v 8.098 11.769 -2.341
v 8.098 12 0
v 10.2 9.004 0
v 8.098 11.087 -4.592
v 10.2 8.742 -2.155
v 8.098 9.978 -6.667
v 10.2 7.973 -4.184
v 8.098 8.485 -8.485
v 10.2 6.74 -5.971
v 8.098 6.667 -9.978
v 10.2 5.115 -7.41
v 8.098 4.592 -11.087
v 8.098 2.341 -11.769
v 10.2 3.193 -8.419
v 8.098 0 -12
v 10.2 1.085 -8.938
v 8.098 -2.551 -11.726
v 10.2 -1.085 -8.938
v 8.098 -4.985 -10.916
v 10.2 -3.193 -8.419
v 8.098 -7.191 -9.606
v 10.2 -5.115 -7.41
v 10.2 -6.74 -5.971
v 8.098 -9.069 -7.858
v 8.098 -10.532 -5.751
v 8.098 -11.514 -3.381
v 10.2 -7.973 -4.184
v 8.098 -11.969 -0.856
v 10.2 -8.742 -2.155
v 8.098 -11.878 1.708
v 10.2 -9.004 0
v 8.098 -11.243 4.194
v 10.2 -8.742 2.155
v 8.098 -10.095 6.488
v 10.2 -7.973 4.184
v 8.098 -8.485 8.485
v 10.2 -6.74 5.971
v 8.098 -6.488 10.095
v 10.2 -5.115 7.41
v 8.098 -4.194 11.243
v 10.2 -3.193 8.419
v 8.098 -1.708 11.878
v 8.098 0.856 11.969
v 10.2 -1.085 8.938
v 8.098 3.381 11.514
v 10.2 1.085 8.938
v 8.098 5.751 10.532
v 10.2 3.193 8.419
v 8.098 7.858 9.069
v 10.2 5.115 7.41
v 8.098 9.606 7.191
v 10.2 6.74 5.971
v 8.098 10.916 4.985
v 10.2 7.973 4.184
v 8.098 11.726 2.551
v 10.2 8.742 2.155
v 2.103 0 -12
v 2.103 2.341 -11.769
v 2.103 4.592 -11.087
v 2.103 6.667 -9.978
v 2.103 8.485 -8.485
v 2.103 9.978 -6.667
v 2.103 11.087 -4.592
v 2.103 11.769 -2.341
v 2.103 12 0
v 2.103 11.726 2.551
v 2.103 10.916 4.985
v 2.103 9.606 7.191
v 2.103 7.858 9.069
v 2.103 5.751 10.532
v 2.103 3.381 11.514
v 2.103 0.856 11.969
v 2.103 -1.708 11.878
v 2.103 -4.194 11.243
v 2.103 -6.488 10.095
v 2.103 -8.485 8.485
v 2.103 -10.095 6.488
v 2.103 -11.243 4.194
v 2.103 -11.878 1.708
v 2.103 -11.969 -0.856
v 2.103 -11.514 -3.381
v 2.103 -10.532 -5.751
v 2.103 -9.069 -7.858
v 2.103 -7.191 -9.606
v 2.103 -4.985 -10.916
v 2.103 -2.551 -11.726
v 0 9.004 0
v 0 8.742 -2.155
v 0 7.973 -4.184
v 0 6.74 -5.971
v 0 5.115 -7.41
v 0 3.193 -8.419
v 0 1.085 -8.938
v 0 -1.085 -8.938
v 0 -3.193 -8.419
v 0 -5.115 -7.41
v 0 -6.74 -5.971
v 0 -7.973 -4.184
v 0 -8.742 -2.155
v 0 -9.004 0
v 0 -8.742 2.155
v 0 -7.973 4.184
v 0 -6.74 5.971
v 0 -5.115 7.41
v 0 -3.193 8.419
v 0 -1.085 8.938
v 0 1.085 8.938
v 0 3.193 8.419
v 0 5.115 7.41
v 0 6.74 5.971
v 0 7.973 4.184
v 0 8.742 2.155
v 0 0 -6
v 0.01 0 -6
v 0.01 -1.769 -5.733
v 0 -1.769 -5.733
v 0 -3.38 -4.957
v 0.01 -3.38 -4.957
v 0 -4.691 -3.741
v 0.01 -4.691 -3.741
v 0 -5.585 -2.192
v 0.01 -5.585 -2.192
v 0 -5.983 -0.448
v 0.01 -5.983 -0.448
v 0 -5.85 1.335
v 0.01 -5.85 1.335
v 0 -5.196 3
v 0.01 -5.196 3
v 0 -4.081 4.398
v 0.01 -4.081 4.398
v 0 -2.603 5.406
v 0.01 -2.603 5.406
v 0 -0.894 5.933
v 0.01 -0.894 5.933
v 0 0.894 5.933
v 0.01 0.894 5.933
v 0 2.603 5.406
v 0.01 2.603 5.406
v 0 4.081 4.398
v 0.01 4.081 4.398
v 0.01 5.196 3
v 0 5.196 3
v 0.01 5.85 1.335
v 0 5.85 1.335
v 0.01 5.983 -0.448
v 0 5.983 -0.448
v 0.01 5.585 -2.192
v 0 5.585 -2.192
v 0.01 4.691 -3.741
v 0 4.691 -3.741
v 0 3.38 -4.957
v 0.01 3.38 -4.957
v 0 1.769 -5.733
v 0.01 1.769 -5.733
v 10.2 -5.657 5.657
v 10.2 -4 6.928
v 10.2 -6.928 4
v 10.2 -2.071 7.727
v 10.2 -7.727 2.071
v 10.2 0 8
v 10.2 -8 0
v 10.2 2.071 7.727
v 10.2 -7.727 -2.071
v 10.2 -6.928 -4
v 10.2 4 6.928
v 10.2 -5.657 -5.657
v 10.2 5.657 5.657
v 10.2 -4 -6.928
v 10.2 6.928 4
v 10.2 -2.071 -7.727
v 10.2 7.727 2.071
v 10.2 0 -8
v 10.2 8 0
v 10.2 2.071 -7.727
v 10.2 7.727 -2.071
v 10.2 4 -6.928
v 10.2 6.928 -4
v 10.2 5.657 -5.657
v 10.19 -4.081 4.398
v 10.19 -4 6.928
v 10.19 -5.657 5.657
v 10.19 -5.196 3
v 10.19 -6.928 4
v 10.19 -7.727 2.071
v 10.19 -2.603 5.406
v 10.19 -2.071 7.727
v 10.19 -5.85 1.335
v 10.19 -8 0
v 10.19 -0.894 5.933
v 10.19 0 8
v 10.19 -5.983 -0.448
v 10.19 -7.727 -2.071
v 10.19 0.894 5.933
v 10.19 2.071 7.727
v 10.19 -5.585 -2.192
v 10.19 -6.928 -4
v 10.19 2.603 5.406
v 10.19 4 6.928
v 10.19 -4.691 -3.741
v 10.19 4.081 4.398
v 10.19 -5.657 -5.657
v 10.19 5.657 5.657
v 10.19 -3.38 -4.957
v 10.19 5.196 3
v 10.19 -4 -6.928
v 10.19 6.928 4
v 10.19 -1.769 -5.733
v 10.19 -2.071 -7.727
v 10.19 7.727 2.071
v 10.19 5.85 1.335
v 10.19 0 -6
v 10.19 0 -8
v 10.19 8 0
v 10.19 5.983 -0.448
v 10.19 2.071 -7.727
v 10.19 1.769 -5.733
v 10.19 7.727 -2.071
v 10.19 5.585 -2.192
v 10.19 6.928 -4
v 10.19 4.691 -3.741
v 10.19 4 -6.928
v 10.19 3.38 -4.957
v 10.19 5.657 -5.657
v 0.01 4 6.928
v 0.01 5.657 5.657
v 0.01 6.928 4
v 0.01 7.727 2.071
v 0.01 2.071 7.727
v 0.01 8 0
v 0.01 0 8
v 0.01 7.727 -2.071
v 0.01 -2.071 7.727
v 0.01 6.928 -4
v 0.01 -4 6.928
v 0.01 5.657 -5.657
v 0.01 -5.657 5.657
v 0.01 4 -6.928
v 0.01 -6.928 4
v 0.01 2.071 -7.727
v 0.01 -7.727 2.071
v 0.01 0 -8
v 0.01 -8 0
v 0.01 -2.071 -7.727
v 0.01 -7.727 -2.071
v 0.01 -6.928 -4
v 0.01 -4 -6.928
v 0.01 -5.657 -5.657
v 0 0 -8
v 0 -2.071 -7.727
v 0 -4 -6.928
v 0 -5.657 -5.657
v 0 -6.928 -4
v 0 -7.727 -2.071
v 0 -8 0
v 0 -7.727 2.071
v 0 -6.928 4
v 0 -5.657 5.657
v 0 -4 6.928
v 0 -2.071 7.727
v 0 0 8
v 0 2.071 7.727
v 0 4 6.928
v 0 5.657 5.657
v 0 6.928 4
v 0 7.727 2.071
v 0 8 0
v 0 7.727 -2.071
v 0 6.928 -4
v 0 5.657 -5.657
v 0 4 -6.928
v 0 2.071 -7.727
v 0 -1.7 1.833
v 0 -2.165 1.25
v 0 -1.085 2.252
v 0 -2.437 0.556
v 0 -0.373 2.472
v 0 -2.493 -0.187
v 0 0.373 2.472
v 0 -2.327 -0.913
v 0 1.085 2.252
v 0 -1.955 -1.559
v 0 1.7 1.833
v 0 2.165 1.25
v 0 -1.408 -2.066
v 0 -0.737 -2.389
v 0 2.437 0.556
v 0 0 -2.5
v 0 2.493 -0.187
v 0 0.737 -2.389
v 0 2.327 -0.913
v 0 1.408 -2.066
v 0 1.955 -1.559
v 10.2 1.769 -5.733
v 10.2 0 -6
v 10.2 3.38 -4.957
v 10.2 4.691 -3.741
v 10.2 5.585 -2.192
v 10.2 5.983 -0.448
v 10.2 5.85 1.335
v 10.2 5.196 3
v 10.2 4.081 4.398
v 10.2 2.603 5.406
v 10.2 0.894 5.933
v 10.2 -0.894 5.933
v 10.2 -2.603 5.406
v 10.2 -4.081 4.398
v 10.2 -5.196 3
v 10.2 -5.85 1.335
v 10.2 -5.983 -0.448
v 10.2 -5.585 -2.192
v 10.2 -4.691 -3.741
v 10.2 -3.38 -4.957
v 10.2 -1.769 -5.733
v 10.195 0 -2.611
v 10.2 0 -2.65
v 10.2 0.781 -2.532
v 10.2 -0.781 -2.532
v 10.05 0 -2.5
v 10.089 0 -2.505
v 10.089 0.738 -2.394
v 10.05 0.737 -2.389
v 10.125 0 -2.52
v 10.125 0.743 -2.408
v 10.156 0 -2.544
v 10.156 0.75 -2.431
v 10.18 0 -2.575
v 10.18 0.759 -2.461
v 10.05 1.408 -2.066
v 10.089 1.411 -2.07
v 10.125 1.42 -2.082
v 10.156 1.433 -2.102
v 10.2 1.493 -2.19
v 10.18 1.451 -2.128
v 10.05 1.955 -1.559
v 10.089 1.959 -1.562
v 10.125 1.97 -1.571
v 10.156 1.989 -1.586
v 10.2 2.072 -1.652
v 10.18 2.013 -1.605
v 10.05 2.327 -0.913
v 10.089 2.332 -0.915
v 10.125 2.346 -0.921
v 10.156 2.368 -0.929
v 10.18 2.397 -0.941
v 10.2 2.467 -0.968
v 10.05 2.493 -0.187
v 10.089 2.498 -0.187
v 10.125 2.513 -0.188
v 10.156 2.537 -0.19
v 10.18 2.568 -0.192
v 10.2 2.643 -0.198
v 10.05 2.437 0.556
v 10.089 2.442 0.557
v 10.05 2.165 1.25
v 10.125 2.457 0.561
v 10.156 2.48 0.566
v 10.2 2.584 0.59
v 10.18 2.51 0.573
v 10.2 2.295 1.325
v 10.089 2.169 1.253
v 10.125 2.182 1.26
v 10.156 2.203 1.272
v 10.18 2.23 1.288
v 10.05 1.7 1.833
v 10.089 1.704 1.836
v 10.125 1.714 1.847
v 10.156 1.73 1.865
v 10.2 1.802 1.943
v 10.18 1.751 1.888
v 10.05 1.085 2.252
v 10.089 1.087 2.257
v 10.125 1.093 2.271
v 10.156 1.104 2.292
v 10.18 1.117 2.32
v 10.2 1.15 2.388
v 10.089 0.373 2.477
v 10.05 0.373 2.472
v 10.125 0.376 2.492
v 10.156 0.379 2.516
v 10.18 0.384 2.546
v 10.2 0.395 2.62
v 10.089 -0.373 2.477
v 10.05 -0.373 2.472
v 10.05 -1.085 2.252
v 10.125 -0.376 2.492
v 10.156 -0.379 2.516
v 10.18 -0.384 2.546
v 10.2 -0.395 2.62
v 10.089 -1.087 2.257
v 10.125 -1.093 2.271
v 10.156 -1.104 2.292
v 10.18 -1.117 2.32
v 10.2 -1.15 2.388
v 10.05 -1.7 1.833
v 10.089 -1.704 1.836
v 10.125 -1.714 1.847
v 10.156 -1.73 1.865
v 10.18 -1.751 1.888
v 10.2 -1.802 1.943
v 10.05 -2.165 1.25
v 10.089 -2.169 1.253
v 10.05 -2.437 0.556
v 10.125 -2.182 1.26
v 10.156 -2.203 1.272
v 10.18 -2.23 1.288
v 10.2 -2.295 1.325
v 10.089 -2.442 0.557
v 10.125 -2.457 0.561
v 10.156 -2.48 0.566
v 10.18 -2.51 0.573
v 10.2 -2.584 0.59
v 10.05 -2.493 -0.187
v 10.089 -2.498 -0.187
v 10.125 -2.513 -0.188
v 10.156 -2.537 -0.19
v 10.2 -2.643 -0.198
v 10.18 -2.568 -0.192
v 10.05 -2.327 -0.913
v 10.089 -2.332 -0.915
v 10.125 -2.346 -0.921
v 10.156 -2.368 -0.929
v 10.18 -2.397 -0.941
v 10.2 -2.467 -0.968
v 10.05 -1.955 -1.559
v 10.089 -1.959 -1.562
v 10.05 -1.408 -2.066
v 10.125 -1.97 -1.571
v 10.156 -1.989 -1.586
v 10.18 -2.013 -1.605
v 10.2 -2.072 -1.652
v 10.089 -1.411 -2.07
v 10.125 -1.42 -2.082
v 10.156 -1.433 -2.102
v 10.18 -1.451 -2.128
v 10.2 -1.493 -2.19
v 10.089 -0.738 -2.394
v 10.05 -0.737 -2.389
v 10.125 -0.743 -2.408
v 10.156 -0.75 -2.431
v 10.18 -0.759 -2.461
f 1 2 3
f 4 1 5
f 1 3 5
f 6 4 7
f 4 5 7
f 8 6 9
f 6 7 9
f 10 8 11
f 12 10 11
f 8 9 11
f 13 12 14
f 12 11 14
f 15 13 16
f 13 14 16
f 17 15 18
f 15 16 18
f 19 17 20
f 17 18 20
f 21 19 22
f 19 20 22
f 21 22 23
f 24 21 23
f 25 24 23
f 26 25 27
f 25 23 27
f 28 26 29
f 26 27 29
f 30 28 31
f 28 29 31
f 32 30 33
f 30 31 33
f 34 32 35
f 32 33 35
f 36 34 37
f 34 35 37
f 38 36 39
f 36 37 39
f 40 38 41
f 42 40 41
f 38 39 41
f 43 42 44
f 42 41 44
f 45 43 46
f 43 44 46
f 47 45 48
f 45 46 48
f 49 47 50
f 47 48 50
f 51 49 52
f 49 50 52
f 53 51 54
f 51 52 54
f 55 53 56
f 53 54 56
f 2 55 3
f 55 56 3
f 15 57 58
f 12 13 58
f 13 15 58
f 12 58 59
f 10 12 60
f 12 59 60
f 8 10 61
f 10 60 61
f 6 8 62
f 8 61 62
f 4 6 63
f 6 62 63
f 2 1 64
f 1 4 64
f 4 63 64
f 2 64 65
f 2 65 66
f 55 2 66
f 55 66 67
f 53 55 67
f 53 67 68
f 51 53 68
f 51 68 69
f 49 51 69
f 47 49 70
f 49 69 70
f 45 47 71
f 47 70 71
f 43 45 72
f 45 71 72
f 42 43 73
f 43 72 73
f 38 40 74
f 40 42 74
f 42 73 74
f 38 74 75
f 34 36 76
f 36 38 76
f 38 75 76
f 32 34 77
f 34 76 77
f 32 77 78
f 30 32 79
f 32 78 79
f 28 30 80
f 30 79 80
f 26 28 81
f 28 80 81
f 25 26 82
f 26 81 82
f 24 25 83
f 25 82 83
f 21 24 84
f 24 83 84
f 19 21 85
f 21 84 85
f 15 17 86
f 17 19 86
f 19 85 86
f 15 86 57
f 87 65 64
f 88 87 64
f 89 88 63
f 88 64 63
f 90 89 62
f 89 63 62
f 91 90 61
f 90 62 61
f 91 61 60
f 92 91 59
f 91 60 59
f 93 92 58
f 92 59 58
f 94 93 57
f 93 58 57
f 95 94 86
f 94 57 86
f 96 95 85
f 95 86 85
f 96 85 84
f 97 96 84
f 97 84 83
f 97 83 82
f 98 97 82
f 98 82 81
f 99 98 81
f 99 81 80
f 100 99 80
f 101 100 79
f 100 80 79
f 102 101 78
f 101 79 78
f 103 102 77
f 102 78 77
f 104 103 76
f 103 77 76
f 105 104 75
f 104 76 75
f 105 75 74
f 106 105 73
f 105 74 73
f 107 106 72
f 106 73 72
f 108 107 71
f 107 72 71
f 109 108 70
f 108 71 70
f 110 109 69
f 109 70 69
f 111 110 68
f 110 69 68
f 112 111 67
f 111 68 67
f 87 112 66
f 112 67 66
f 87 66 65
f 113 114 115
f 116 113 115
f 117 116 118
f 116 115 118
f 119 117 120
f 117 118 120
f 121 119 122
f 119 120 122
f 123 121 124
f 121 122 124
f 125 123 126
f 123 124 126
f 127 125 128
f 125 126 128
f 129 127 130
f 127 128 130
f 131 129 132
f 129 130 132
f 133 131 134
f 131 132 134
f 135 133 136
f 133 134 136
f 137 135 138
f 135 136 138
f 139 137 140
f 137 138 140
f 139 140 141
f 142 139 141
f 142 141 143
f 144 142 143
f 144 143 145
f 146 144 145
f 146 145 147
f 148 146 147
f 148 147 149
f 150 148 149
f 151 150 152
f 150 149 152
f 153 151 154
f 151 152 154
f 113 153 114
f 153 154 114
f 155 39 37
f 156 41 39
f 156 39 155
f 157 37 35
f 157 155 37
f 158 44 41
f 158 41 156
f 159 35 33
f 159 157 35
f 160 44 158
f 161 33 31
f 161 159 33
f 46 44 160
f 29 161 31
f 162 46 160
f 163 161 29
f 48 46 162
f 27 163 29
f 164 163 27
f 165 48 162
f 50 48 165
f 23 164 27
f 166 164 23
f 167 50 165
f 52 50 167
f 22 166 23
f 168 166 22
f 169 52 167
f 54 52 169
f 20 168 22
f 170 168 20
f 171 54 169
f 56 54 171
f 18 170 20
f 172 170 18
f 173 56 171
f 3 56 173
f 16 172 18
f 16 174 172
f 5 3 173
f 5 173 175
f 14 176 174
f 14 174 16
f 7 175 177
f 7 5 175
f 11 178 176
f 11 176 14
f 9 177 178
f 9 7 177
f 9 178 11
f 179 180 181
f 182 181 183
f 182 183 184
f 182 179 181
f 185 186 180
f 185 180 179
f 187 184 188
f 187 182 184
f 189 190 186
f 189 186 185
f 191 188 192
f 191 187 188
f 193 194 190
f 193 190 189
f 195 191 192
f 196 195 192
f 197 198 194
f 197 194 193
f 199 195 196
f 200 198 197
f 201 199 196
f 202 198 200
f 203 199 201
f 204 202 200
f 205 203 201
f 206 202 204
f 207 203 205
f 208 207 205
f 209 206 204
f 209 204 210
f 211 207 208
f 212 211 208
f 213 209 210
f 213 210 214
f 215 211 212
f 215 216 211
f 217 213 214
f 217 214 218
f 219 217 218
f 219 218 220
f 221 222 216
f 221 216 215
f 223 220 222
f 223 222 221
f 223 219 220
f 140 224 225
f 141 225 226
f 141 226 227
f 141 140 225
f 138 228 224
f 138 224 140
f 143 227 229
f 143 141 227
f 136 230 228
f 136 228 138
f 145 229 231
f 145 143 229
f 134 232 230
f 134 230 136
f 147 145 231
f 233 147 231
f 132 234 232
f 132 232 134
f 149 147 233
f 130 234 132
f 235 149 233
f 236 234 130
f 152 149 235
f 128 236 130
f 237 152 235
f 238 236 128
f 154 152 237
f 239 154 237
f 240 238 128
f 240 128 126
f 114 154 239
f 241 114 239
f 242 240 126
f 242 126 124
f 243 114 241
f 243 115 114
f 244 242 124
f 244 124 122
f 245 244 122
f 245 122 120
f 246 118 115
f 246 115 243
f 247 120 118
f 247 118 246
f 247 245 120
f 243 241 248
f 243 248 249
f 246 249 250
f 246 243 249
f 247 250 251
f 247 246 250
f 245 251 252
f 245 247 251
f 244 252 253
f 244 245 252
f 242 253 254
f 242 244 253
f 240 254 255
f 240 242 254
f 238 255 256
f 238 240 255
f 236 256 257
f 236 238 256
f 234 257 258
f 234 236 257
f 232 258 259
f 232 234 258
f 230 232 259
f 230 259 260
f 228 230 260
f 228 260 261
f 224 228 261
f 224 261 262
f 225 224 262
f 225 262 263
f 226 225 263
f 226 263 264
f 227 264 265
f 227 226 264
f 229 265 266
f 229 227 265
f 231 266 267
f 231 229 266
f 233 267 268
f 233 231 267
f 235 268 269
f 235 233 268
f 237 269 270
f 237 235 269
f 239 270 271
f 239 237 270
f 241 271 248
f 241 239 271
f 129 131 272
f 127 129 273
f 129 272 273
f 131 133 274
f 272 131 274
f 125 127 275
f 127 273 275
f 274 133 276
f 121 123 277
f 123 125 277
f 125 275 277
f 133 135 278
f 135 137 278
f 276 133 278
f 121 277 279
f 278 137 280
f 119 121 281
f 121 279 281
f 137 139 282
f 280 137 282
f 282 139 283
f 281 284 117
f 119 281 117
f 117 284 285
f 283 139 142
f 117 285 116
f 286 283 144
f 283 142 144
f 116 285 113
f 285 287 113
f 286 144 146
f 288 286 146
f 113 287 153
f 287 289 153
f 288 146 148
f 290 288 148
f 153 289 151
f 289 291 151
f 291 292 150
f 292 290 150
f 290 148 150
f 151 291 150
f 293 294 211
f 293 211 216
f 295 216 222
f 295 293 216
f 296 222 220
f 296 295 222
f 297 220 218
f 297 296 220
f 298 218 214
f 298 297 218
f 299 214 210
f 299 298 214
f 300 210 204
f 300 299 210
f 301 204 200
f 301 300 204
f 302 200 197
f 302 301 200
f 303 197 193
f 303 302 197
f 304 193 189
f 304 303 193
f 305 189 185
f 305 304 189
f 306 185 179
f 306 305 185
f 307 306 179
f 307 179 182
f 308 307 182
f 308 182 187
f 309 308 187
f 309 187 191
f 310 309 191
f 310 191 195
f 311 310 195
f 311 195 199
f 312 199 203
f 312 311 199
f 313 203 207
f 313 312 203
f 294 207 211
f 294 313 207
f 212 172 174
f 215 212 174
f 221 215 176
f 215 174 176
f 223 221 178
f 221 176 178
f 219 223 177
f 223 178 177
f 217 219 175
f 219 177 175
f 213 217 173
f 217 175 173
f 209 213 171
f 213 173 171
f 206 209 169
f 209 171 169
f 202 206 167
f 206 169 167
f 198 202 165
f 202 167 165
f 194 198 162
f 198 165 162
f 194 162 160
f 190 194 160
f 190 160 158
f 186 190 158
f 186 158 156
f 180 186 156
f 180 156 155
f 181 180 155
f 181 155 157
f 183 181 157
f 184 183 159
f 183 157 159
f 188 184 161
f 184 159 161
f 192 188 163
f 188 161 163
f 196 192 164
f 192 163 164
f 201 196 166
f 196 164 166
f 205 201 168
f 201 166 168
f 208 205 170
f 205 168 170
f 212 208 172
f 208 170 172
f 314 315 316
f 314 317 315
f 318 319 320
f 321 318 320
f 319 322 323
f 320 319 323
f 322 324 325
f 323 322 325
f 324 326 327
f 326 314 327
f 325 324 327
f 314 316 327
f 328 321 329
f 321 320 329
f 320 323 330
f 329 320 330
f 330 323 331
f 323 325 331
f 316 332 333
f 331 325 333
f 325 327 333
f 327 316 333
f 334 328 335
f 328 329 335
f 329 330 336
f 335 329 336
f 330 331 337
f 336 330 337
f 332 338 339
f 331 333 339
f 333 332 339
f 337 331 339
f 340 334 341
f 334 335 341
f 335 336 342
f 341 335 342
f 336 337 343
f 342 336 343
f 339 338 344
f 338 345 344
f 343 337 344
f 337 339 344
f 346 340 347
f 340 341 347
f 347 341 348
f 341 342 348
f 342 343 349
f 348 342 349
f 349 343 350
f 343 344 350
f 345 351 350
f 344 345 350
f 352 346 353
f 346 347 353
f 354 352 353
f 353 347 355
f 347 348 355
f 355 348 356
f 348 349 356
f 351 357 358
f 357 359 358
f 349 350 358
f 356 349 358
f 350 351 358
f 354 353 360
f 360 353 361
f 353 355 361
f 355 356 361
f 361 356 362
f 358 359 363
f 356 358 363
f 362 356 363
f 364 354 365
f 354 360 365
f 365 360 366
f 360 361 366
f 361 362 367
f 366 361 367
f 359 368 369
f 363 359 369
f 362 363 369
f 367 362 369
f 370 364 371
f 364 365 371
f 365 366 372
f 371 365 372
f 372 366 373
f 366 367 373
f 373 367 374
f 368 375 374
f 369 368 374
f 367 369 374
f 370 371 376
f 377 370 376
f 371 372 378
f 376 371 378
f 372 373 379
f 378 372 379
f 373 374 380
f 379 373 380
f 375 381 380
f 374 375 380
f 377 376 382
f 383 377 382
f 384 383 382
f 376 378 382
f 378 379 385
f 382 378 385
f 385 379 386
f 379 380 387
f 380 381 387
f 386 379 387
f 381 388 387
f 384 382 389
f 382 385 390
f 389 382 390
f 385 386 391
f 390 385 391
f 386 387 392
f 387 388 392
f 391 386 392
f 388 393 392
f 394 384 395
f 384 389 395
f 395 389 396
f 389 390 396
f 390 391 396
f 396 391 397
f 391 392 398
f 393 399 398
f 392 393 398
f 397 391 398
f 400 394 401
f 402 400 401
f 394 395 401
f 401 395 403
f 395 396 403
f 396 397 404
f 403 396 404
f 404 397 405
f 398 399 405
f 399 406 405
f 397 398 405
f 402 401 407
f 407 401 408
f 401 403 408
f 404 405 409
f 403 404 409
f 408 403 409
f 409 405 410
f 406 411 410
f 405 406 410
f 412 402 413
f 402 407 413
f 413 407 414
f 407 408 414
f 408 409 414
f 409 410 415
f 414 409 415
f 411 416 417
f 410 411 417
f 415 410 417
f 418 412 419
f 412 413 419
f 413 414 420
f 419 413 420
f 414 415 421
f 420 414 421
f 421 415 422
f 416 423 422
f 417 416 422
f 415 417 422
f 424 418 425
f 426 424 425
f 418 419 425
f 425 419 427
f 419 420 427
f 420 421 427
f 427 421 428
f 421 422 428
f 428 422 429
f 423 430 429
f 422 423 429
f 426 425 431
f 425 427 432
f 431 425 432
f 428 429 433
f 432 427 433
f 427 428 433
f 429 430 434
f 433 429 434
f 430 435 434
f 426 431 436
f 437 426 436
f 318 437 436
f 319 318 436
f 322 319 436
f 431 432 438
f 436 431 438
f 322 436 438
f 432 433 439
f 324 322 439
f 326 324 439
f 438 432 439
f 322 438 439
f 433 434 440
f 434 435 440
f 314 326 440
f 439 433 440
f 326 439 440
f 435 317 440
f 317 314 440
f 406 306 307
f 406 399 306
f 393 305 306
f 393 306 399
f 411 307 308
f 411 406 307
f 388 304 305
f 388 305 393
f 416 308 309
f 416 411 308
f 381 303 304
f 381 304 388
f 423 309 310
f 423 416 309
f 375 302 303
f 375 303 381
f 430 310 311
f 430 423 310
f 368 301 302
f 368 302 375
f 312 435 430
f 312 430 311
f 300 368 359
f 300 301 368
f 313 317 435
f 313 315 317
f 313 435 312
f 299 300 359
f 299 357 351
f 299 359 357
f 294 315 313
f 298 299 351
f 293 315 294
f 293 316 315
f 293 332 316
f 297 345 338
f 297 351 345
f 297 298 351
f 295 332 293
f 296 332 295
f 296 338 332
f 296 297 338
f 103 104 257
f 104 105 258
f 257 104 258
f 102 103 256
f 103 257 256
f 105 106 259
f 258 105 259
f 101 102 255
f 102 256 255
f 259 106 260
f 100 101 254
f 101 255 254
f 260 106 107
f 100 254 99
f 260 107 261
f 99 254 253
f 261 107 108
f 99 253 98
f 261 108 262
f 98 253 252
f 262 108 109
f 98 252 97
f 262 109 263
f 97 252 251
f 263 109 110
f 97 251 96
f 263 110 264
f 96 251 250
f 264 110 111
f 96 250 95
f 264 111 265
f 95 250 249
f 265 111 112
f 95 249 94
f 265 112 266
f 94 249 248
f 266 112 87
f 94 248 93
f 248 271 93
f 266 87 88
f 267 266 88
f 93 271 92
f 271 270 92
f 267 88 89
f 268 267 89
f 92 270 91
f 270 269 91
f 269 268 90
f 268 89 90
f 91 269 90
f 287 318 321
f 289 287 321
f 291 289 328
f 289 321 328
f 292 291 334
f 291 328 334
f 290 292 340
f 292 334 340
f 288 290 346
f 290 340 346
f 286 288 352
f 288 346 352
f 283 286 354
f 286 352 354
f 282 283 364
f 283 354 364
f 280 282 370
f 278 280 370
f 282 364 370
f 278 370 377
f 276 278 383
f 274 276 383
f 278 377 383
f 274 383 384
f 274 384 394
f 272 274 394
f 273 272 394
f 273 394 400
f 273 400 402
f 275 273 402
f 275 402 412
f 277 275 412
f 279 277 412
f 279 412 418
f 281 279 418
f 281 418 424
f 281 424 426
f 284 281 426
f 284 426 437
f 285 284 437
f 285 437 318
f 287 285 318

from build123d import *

# Parameters (mm, degrees)
BOSS_EXTRU_2_DEPTH      = 5.1
BOSS_EXTRU_2_DEPTH_BACK = 5.1
ESQUISSE9_R             = 12
ESQUISSE10_R            = 2.5
ENL_V_MAT_EXTRU_3_DEPTH = 20.8
CONG_1_R                = 0.15
ESQUISSE13_R            = 8
ESQUISSE13_R_2          = 6
ENL_V_MAT_EXTRU_4_DEPTH = 0.01
ENL_V_START             = -0.01
ESQUISSE14_R            = 8
ESQUISSE14_R_2          = 6
ENL_V_MAT_EXTRU_5_DEPTH = 0.01


with BuildPart() as part:
    # Esquisse9 → Boss.-Extru.2 (new, two sides: drawn at the far end of the back side and taken through both)
    with BuildSketch(Plane(origin=(5.1, 0, 0), x_dir=(0, 0, -1), z_dir=(1, 0, 0)).offset(-BOSS_EXTRU_2_DEPTH_BACK)):
        Circle(ESQUISSE9_R)
    extrude(amount=BOSS_EXTRU_2_DEPTH + BOSS_EXTRU_2_DEPTH_BACK)

    # Esquisse10 → Enlèv. mat.-Extru.3 (cut, through all)
    with BuildSketch(Plane(origin=(10.2, 0, 0), x_dir=(0, 0, -1), z_dir=(1, 0, 0))):
        Circle(ESQUISSE10_R)
    extrude(amount=-ENL_V_MAT_EXTRU_3_DEPTH, mode=Mode.SUBTRACT)

    # Esquisse11 → Enlèvement de matière-Révolution1 (revolve, cut)
    with BuildSketch(Plane.XY):
        Polygon((0, -9.003888398), (2.102617573, -12), (8.097659703, -12), (10.2, -9.003888398), (10.2, -12), (7.948691549, -12.31078505), (2.020448567, -12.31078505), (0, -12), align=None)
        Polygon((10.2, 12), (7.948691549, 12.31078505), (2.020448567, 12.31078505), (0, 12), (0, 9.003888398), (2.102617573, 12), (8.097659703, 12), (10.2, 9.003888398), align=None)
    revolve(axis=Axis((10.2, 0, 0), (-1, 0, 0)), mode=Mode.SUBTRACT)

    # Congé1
    cong_1_edges = [part.edges().sort_by_distance(p)[0] for p in [
        (10.2, 0, 2.5),
    ]]
    fillet(cong_1_edges, radius=CONG_1_R)

    # Esquisse13 → Enlèv. mat.-Extru.4 (cut)
    with BuildSketch(Plane(origin=(10.2, 0, 0), x_dir=(0, 0, -1), z_dir=(1, 0, 0))):
        Circle(ESQUISSE13_R)
        Circle(ESQUISSE13_R_2, mode=Mode.SUBTRACT)
    extrude(amount=-ENL_V_MAT_EXTRU_4_DEPTH, mode=Mode.SUBTRACT)

    # Esquisse14 → Enlèv. mat.-Extru.5 (cut)
    with BuildSketch(Plane.ZY.offset(ENL_V_START)):
        Circle(ESQUISSE14_R)
        Circle(ESQUISSE14_R_2, mode=Mode.SUBTRACT)
    extrude(amount=ENL_V_MAT_EXTRU_5_DEPTH, mode=Mode.SUBTRACT)


solid = part.part
